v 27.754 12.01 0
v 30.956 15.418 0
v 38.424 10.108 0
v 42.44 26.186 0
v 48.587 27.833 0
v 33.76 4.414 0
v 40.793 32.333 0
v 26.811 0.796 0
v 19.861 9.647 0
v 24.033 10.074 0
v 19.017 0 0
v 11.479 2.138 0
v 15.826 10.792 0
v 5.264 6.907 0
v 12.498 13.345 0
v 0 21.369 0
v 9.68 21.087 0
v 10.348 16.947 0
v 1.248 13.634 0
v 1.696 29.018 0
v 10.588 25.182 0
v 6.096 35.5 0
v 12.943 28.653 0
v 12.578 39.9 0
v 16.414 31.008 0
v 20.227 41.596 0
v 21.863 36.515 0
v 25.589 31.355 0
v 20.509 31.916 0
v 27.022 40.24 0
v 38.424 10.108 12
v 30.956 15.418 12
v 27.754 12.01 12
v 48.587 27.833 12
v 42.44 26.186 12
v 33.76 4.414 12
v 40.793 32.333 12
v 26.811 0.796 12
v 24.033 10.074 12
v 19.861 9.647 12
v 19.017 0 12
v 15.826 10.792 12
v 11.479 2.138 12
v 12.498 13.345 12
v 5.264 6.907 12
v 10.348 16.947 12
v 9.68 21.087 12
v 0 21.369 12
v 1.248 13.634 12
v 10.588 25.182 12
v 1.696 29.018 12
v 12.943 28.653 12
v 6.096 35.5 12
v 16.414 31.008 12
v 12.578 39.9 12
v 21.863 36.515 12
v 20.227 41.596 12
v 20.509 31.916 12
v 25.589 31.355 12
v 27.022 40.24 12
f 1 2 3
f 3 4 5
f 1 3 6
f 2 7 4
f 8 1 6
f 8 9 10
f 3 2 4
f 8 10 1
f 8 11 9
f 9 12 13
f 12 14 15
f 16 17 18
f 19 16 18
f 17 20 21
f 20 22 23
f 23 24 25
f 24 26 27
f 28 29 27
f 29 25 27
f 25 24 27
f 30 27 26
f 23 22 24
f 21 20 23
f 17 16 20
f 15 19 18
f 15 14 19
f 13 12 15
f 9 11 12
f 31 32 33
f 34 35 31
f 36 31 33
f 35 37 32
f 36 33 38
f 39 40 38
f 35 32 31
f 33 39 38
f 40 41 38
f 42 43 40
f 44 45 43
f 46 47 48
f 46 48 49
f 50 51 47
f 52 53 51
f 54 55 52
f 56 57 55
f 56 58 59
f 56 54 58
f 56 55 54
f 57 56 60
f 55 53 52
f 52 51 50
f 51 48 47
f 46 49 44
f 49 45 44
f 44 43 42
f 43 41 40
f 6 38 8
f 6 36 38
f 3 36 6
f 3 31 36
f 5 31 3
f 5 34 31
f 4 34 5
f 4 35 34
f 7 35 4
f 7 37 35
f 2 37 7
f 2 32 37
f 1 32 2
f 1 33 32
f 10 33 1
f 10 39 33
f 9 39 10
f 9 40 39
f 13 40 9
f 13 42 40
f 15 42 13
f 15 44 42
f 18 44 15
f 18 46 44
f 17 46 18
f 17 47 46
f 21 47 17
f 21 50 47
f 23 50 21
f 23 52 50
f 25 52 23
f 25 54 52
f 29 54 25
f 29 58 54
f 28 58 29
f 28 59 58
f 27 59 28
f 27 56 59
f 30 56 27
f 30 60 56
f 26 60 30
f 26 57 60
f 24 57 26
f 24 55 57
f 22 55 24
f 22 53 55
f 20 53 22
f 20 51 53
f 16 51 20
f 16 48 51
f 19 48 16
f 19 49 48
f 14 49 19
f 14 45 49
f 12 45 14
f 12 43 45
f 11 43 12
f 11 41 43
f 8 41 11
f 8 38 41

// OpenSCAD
$fn = 32;

// ----------------------------------------------------------------------
// Eye lug: ring_tail, 12 mm thick
// ----------------------------------------------------------------------

// --- parameters (mm) ---
profile_height = 12;      // extrusion height
profile_points = 30;      // points of the closed outline

profile = [[21.863, 36.515], [27.022, 40.24], [20.227, 41.596], [12.578, 39.9], [6.096, 35.5], [1.696, 29.018], [0, 21.369], [1.248, 13.634], [5.264, 6.907], [11.479, 2.138], [19.017, 0], [26.811, 0.796], [33.76, 4.414], [38.424, 10.108], [48.587, 27.833], [42.44, 26.186], [40.793, 32.333], [30.956, 15.418], [27.754, 12.01], [24.033, 10.074], [19.861, 9.647], [15.826, 10.792], [12.498, 13.345], [10.348, 16.947], [9.68, 21.087], [10.588, 25.182], [12.943, 28.653], [16.414, 31.008], [20.509, 31.916], [25.589, 31.355]];  // single closed polygon, 30 points, counter clockwise

// --- the one profile operation ---
linear_extrude(height = profile_height) polygon(points = profile);
